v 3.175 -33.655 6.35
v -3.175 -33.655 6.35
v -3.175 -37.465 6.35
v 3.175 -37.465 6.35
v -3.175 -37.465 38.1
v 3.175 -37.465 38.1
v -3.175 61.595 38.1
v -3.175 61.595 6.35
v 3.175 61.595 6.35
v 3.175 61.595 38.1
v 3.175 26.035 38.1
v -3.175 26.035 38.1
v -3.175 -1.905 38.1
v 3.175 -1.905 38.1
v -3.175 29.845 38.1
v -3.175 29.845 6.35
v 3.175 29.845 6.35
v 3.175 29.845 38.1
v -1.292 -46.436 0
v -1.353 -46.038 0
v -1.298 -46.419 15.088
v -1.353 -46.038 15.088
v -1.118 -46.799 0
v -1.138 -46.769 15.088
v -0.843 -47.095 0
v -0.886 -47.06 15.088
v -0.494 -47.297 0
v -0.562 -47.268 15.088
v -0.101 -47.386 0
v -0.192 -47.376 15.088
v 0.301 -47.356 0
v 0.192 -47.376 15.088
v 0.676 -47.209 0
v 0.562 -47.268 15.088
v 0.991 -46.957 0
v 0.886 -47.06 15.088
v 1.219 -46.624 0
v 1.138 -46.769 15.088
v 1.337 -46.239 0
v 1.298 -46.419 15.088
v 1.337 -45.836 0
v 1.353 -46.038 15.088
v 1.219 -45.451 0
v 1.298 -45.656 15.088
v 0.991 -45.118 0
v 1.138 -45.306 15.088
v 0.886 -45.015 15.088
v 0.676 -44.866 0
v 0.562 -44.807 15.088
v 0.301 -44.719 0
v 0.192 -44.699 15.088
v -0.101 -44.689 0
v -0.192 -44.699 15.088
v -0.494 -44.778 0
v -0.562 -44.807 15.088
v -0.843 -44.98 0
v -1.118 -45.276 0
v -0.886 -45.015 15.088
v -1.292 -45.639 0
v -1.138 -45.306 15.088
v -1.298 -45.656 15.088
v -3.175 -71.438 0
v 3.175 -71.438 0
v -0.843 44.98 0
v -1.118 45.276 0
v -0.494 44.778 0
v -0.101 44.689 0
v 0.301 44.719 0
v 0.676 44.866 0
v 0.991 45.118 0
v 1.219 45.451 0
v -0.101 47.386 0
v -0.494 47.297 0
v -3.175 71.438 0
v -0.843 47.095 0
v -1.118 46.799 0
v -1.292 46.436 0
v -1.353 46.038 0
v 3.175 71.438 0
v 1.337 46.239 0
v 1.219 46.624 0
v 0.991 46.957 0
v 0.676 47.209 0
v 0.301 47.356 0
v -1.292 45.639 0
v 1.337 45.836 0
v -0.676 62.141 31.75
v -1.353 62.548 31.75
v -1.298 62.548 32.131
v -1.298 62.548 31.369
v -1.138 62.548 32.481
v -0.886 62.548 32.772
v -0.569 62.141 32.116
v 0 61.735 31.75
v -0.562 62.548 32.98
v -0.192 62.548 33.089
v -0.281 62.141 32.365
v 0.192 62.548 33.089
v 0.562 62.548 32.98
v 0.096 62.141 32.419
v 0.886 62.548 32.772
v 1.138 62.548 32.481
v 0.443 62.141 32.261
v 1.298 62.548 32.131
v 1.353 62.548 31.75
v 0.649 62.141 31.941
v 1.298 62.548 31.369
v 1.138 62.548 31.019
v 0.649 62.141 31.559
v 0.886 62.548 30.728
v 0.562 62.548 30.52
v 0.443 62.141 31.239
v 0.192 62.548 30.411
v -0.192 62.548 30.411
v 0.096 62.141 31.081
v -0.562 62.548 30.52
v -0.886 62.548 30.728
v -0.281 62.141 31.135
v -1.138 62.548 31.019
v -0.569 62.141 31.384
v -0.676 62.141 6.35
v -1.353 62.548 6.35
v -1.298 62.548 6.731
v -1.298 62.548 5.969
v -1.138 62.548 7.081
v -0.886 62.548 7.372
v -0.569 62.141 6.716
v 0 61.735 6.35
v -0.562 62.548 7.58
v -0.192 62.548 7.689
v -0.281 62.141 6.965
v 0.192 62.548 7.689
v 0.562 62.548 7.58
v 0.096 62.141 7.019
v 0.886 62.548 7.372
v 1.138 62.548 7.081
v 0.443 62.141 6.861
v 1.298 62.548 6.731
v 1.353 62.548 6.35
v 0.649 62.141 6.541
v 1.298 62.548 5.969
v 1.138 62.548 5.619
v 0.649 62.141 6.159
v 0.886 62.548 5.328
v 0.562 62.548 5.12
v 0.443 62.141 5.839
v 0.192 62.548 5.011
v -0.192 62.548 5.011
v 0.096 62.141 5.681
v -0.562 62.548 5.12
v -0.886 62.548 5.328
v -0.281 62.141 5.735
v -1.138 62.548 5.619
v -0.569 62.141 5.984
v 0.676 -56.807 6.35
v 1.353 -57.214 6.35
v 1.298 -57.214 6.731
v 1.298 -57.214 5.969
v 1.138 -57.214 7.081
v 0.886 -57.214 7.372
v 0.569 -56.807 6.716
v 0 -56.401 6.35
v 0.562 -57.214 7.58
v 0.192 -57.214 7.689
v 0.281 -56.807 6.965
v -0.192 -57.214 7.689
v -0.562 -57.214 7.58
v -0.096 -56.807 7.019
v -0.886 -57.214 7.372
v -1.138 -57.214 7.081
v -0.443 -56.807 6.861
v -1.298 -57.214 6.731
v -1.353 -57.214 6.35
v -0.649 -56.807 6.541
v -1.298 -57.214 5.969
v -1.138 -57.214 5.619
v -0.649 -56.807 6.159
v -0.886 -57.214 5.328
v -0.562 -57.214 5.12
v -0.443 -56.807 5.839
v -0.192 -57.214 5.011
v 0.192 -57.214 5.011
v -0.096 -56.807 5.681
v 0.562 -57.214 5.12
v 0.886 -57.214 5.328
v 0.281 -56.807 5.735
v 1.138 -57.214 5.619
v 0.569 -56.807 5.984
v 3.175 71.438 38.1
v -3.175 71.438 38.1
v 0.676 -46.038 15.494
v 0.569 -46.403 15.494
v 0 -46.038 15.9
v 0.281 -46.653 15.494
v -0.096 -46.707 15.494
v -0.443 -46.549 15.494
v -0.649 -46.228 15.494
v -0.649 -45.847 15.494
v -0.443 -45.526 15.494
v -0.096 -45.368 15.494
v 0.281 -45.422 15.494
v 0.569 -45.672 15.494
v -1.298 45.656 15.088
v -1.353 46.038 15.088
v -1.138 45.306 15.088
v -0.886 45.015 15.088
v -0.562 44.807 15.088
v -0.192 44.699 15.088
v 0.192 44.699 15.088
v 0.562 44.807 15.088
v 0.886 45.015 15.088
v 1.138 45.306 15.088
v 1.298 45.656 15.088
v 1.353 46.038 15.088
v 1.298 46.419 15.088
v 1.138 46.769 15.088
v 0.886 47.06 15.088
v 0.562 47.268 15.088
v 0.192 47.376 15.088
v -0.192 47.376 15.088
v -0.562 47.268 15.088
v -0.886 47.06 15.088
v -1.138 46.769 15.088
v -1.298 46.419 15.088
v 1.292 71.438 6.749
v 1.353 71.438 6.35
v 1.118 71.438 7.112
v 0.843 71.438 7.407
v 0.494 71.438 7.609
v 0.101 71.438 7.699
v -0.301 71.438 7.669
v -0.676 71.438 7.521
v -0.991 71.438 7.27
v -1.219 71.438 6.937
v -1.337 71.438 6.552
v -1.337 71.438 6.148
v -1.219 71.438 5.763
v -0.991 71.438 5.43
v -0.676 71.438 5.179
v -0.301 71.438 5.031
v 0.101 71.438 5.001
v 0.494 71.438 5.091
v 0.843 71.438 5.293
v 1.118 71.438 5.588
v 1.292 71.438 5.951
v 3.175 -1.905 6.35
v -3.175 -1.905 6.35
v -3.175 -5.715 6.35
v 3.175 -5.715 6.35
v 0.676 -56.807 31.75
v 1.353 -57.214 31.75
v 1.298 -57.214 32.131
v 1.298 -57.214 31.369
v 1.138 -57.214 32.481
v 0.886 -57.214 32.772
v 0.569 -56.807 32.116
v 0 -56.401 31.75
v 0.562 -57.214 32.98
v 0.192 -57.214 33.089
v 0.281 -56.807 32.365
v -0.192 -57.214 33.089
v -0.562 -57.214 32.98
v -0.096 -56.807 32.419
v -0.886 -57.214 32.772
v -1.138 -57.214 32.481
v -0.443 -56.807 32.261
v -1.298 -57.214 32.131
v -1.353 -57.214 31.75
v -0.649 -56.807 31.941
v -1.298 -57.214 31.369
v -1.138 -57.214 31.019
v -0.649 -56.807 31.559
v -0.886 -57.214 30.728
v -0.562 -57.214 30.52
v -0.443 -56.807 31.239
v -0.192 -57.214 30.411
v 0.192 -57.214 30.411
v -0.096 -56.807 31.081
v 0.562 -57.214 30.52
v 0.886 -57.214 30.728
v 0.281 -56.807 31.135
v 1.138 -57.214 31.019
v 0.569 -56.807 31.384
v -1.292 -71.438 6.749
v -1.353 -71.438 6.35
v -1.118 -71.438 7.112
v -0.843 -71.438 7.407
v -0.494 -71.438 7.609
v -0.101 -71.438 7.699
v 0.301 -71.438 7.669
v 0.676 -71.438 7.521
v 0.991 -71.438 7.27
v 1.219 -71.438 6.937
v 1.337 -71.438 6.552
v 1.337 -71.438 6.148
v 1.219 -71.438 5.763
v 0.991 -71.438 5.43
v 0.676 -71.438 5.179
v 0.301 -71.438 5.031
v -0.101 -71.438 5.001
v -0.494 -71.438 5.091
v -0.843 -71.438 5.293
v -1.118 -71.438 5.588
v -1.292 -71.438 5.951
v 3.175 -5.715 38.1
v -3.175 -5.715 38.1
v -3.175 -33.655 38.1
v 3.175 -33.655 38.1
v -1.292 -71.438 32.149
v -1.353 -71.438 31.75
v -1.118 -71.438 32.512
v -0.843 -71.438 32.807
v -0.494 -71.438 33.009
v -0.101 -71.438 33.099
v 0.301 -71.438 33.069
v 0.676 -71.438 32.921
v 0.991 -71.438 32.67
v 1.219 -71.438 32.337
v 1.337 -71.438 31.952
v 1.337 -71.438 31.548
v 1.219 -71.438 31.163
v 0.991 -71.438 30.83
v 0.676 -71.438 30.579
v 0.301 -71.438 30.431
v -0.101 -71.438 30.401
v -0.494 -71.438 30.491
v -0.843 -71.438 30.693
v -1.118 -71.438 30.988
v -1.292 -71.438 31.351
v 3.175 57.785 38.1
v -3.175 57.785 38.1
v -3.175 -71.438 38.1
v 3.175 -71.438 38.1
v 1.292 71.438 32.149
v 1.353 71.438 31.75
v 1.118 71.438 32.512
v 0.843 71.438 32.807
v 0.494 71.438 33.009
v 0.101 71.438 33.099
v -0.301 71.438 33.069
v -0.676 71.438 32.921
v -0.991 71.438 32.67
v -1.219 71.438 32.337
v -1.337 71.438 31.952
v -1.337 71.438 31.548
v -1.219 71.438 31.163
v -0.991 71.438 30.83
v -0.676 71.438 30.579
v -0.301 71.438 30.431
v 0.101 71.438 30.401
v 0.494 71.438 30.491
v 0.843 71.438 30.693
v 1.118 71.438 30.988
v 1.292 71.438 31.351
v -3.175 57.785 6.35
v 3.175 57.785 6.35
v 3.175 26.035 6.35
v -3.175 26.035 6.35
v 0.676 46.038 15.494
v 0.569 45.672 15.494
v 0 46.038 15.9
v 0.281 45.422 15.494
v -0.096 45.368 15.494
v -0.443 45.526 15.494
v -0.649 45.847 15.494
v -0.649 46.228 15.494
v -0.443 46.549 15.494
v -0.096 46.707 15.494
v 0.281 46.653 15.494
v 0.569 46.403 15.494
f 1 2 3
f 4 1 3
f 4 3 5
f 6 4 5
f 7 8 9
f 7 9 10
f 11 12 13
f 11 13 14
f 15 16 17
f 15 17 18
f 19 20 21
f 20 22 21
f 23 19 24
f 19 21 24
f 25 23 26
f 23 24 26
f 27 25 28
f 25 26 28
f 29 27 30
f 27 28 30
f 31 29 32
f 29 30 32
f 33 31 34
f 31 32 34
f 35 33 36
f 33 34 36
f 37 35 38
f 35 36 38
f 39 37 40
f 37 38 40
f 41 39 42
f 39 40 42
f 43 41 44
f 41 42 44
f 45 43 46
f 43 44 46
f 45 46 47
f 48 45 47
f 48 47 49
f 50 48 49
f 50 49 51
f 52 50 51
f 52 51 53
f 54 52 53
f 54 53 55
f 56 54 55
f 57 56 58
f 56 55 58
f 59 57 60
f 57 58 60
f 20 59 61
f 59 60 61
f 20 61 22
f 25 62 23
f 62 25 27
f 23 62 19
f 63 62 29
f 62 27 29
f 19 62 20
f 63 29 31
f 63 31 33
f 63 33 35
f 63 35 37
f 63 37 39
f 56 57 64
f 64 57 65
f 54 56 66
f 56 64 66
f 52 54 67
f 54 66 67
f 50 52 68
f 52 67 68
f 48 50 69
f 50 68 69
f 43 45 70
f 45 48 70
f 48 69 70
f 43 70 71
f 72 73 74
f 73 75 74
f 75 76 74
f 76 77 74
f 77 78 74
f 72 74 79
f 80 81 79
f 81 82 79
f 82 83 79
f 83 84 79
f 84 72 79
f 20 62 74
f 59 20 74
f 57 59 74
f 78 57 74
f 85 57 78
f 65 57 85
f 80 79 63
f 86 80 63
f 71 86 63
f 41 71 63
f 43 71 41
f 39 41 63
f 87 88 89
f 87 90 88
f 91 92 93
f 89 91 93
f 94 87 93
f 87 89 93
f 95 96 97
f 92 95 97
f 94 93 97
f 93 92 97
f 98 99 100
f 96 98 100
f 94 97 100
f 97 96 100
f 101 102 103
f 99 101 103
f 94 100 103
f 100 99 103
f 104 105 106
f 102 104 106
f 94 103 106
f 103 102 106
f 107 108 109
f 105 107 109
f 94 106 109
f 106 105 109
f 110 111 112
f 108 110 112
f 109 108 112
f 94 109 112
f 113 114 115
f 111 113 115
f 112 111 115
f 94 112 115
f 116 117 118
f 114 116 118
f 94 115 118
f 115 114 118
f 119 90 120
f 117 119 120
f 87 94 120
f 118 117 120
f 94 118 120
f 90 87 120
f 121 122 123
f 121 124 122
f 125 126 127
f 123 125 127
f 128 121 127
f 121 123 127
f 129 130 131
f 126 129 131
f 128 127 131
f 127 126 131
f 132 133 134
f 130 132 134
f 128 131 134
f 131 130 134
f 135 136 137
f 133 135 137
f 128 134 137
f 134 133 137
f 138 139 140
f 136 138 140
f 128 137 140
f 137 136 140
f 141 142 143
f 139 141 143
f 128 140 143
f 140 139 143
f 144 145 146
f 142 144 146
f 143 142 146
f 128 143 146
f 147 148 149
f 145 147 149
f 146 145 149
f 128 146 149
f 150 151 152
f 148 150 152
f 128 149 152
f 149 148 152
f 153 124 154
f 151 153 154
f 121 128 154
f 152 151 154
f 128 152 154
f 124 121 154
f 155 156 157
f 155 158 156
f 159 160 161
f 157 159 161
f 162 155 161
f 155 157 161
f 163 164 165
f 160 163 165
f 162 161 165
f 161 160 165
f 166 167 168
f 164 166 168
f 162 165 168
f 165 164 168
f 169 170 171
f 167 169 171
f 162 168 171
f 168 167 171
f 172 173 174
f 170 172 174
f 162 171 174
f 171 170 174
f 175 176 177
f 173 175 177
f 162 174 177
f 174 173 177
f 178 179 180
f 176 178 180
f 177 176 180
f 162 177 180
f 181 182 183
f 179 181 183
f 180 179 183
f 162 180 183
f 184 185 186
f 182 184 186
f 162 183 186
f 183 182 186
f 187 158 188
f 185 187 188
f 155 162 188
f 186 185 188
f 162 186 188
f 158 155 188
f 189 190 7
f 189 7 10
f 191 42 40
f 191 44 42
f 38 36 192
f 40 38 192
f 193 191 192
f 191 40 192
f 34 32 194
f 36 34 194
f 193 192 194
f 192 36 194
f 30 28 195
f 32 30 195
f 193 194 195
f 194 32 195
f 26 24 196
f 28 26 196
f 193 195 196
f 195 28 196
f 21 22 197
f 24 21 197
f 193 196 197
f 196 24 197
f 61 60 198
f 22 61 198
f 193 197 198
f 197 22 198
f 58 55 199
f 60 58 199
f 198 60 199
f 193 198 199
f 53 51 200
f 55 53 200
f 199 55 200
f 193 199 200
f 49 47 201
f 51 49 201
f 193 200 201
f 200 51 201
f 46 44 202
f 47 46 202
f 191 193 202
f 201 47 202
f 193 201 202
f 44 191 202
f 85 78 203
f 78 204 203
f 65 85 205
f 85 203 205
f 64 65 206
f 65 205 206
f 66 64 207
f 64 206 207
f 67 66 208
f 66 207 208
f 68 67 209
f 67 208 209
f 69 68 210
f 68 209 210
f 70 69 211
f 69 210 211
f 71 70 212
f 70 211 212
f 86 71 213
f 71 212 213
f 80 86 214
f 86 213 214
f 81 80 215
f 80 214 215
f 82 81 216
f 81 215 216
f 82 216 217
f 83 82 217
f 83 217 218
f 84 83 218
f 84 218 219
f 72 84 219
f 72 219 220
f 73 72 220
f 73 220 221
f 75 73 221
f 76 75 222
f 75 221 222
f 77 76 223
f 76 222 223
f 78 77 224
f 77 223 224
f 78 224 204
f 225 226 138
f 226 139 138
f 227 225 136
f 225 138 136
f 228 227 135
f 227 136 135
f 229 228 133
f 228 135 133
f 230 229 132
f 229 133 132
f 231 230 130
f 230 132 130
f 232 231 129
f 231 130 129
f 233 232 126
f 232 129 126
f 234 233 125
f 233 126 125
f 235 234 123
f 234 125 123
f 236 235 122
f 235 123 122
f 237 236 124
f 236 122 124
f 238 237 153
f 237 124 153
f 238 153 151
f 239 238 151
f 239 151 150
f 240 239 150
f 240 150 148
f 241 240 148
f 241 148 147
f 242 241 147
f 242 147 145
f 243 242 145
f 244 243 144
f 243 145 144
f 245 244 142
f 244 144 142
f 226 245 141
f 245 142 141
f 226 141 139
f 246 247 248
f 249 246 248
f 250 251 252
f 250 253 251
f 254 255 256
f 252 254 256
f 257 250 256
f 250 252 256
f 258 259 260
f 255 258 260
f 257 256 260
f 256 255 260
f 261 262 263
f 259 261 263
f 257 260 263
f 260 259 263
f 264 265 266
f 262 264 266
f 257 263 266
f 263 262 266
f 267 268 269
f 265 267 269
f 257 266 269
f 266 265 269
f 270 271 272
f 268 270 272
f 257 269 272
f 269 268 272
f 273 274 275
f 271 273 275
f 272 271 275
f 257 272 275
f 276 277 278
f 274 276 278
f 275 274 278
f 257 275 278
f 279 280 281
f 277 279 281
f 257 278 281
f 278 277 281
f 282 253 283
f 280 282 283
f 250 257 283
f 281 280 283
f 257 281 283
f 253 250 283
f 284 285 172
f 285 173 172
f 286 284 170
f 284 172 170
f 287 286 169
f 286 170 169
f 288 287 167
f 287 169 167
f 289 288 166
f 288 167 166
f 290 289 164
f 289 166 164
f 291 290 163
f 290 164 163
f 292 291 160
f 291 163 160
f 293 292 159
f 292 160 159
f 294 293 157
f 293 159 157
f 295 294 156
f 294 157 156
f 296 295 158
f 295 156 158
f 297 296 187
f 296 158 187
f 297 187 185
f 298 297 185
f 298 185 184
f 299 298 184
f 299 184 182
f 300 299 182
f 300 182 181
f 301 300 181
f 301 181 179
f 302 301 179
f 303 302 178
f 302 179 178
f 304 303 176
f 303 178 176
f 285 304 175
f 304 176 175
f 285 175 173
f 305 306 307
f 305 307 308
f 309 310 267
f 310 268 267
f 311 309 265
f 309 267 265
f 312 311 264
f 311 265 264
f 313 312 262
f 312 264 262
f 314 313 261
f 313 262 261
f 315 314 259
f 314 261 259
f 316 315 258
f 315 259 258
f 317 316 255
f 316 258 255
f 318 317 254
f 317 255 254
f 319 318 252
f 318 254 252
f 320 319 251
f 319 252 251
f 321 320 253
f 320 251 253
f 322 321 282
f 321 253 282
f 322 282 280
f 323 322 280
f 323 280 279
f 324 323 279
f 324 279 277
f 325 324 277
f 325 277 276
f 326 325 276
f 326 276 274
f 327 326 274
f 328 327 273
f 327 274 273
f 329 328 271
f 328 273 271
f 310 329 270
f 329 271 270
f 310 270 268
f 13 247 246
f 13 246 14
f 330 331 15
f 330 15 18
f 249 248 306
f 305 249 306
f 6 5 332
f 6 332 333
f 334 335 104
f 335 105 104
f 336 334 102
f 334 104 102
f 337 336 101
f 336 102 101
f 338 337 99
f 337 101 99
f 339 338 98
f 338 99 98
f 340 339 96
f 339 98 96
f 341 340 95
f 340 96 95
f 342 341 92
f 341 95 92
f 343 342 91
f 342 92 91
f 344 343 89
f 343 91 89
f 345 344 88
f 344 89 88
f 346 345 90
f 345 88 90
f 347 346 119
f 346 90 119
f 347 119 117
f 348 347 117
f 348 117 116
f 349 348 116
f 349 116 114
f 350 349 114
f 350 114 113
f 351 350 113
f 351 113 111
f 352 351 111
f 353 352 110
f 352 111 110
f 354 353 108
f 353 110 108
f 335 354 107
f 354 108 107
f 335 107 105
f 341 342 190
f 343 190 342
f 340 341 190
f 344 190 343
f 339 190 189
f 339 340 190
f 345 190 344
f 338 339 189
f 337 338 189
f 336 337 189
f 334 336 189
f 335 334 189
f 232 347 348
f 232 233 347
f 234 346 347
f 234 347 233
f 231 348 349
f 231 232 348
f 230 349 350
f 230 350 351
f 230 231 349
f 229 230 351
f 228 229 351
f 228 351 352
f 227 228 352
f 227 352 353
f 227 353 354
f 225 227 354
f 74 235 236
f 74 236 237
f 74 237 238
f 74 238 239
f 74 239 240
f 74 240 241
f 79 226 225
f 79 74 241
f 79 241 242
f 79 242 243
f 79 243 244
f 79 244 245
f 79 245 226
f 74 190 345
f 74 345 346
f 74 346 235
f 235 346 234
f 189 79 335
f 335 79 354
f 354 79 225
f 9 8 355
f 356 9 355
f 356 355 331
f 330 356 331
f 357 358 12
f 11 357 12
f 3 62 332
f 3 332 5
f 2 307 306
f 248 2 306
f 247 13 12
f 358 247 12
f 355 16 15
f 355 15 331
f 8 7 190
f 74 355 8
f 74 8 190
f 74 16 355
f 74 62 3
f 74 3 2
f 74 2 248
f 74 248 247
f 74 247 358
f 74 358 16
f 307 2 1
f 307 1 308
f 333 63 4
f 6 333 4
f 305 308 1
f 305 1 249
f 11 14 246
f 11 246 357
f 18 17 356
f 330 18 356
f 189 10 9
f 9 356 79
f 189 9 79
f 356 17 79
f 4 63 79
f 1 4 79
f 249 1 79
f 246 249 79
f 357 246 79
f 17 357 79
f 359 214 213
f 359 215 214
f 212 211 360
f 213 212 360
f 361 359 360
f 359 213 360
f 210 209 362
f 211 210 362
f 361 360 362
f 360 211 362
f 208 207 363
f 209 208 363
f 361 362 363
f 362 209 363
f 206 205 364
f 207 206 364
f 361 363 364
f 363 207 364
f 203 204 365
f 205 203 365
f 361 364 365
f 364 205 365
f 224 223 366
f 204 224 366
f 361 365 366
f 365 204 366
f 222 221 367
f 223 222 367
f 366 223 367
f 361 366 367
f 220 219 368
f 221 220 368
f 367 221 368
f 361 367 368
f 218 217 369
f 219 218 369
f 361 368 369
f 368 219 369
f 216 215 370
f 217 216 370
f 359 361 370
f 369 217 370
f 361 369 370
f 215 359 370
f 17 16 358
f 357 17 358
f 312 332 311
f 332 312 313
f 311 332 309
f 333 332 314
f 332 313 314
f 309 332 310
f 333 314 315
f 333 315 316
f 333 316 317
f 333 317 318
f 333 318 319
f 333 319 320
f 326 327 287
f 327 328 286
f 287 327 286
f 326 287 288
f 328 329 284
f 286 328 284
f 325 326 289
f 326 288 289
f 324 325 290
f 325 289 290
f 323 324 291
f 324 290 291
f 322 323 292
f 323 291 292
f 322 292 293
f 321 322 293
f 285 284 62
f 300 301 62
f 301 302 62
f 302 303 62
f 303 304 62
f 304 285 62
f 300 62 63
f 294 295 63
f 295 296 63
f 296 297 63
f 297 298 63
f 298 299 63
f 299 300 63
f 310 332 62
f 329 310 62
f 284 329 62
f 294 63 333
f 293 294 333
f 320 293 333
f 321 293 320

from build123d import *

# Parameters (mm, degrees)
F0_W     = 6.35
F0_H     = 142.875
F1_DEPTH = 38.1
F2_W     = 3.81
F2_H     = 31.75
F3_DEPTH = 6.351
F5_D     = 2.7051
F5_DEPTH = 15.0876
F5_TIP   = 0.8126940303
F8_D     = 2.7051
F8_DEPTH = 14.224
F8_TIP   = 0.8126940303
F9_D     = 2.7051
F9_DEPTH = 8.89
F9_TIP   = 0.8126940303


with BuildPart() as f1:
    # F0 (on Top) → F1 (new body)
    with BuildSketch(Plane.XY):
        Rectangle(F0_W, F0_H)
    extrude(amount=F1_DEPTH)

    # F2 (on face) → F3 (cut, through all)
    with BuildSketch(Plane(origin=(-3.175, 0, 0), x_dir=(0, -1, 0), z_dir=(-1, 0, 0))):
        with Locations((-59.69, 22.225)):
            Rectangle(F2_W, F2_H)
        with Locations((-27.94, 22.225)):
            Rectangle(F2_W, F2_H)
        with Locations((3.81, 22.225)):
            Rectangle(F2_W, F2_H)
        with Locations((35.56, 22.225)):
            Rectangle(F2_W, F2_H)
    extrude(amount=-F3_DEPTH, mode=Mode.SUBTRACT)

    # F5
    with Locations(Plane(origin=(0, 0, 0), x_dir=(1, 0, 0), z_dir=(0, 0, -1))):
        with Locations((0, 46.0375), (0, -46.0375)):
            Hole(F5_D / 2, depth=F5_DEPTH)
            with Locations((0, 0, -(F5_DEPTH + F5_TIP / 2))):  # 118° drill point
                Cone(0, F5_D / 2, F5_TIP, mode=Mode.SUBTRACT)

    # F8
    with Locations(Plane.XZ.offset(71.4375)):
        with Locations((0, 31.75), (0, 6.35)):
            Hole(F8_D / 2, depth=F8_DEPTH)
            with Locations((0, 0, -(F8_DEPTH + F8_TIP / 2))):  # 118° drill point
                Cone(0, F8_D / 2, F8_TIP, mode=Mode.SUBTRACT)

    # F9
    with Locations(Plane(origin=(0, 71.4375, 0), x_dir=(-1, 0, 0), z_dir=(0, 1, 0))):
        with Locations((0, 31.75), (0, 6.35)):
            Hole(F9_D / 2, depth=F9_DEPTH)
            with Locations((0, 0, -(F9_DEPTH + F9_TIP / 2))):  # 118° drill point
                Cone(0, F9_D / 2, F9_TIP, mode=Mode.SUBTRACT)


solid = f1.part
